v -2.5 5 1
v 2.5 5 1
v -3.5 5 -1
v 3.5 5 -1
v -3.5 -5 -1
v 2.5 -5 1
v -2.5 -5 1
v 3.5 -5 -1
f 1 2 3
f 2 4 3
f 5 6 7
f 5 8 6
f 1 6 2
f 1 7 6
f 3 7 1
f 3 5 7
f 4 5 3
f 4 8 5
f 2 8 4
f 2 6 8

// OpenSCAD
include <RemoteControlModules.scad>

w1 = 5;
w2 = 7;
l = 10;
h = 2;

tprism(w1, w2, l, h);
